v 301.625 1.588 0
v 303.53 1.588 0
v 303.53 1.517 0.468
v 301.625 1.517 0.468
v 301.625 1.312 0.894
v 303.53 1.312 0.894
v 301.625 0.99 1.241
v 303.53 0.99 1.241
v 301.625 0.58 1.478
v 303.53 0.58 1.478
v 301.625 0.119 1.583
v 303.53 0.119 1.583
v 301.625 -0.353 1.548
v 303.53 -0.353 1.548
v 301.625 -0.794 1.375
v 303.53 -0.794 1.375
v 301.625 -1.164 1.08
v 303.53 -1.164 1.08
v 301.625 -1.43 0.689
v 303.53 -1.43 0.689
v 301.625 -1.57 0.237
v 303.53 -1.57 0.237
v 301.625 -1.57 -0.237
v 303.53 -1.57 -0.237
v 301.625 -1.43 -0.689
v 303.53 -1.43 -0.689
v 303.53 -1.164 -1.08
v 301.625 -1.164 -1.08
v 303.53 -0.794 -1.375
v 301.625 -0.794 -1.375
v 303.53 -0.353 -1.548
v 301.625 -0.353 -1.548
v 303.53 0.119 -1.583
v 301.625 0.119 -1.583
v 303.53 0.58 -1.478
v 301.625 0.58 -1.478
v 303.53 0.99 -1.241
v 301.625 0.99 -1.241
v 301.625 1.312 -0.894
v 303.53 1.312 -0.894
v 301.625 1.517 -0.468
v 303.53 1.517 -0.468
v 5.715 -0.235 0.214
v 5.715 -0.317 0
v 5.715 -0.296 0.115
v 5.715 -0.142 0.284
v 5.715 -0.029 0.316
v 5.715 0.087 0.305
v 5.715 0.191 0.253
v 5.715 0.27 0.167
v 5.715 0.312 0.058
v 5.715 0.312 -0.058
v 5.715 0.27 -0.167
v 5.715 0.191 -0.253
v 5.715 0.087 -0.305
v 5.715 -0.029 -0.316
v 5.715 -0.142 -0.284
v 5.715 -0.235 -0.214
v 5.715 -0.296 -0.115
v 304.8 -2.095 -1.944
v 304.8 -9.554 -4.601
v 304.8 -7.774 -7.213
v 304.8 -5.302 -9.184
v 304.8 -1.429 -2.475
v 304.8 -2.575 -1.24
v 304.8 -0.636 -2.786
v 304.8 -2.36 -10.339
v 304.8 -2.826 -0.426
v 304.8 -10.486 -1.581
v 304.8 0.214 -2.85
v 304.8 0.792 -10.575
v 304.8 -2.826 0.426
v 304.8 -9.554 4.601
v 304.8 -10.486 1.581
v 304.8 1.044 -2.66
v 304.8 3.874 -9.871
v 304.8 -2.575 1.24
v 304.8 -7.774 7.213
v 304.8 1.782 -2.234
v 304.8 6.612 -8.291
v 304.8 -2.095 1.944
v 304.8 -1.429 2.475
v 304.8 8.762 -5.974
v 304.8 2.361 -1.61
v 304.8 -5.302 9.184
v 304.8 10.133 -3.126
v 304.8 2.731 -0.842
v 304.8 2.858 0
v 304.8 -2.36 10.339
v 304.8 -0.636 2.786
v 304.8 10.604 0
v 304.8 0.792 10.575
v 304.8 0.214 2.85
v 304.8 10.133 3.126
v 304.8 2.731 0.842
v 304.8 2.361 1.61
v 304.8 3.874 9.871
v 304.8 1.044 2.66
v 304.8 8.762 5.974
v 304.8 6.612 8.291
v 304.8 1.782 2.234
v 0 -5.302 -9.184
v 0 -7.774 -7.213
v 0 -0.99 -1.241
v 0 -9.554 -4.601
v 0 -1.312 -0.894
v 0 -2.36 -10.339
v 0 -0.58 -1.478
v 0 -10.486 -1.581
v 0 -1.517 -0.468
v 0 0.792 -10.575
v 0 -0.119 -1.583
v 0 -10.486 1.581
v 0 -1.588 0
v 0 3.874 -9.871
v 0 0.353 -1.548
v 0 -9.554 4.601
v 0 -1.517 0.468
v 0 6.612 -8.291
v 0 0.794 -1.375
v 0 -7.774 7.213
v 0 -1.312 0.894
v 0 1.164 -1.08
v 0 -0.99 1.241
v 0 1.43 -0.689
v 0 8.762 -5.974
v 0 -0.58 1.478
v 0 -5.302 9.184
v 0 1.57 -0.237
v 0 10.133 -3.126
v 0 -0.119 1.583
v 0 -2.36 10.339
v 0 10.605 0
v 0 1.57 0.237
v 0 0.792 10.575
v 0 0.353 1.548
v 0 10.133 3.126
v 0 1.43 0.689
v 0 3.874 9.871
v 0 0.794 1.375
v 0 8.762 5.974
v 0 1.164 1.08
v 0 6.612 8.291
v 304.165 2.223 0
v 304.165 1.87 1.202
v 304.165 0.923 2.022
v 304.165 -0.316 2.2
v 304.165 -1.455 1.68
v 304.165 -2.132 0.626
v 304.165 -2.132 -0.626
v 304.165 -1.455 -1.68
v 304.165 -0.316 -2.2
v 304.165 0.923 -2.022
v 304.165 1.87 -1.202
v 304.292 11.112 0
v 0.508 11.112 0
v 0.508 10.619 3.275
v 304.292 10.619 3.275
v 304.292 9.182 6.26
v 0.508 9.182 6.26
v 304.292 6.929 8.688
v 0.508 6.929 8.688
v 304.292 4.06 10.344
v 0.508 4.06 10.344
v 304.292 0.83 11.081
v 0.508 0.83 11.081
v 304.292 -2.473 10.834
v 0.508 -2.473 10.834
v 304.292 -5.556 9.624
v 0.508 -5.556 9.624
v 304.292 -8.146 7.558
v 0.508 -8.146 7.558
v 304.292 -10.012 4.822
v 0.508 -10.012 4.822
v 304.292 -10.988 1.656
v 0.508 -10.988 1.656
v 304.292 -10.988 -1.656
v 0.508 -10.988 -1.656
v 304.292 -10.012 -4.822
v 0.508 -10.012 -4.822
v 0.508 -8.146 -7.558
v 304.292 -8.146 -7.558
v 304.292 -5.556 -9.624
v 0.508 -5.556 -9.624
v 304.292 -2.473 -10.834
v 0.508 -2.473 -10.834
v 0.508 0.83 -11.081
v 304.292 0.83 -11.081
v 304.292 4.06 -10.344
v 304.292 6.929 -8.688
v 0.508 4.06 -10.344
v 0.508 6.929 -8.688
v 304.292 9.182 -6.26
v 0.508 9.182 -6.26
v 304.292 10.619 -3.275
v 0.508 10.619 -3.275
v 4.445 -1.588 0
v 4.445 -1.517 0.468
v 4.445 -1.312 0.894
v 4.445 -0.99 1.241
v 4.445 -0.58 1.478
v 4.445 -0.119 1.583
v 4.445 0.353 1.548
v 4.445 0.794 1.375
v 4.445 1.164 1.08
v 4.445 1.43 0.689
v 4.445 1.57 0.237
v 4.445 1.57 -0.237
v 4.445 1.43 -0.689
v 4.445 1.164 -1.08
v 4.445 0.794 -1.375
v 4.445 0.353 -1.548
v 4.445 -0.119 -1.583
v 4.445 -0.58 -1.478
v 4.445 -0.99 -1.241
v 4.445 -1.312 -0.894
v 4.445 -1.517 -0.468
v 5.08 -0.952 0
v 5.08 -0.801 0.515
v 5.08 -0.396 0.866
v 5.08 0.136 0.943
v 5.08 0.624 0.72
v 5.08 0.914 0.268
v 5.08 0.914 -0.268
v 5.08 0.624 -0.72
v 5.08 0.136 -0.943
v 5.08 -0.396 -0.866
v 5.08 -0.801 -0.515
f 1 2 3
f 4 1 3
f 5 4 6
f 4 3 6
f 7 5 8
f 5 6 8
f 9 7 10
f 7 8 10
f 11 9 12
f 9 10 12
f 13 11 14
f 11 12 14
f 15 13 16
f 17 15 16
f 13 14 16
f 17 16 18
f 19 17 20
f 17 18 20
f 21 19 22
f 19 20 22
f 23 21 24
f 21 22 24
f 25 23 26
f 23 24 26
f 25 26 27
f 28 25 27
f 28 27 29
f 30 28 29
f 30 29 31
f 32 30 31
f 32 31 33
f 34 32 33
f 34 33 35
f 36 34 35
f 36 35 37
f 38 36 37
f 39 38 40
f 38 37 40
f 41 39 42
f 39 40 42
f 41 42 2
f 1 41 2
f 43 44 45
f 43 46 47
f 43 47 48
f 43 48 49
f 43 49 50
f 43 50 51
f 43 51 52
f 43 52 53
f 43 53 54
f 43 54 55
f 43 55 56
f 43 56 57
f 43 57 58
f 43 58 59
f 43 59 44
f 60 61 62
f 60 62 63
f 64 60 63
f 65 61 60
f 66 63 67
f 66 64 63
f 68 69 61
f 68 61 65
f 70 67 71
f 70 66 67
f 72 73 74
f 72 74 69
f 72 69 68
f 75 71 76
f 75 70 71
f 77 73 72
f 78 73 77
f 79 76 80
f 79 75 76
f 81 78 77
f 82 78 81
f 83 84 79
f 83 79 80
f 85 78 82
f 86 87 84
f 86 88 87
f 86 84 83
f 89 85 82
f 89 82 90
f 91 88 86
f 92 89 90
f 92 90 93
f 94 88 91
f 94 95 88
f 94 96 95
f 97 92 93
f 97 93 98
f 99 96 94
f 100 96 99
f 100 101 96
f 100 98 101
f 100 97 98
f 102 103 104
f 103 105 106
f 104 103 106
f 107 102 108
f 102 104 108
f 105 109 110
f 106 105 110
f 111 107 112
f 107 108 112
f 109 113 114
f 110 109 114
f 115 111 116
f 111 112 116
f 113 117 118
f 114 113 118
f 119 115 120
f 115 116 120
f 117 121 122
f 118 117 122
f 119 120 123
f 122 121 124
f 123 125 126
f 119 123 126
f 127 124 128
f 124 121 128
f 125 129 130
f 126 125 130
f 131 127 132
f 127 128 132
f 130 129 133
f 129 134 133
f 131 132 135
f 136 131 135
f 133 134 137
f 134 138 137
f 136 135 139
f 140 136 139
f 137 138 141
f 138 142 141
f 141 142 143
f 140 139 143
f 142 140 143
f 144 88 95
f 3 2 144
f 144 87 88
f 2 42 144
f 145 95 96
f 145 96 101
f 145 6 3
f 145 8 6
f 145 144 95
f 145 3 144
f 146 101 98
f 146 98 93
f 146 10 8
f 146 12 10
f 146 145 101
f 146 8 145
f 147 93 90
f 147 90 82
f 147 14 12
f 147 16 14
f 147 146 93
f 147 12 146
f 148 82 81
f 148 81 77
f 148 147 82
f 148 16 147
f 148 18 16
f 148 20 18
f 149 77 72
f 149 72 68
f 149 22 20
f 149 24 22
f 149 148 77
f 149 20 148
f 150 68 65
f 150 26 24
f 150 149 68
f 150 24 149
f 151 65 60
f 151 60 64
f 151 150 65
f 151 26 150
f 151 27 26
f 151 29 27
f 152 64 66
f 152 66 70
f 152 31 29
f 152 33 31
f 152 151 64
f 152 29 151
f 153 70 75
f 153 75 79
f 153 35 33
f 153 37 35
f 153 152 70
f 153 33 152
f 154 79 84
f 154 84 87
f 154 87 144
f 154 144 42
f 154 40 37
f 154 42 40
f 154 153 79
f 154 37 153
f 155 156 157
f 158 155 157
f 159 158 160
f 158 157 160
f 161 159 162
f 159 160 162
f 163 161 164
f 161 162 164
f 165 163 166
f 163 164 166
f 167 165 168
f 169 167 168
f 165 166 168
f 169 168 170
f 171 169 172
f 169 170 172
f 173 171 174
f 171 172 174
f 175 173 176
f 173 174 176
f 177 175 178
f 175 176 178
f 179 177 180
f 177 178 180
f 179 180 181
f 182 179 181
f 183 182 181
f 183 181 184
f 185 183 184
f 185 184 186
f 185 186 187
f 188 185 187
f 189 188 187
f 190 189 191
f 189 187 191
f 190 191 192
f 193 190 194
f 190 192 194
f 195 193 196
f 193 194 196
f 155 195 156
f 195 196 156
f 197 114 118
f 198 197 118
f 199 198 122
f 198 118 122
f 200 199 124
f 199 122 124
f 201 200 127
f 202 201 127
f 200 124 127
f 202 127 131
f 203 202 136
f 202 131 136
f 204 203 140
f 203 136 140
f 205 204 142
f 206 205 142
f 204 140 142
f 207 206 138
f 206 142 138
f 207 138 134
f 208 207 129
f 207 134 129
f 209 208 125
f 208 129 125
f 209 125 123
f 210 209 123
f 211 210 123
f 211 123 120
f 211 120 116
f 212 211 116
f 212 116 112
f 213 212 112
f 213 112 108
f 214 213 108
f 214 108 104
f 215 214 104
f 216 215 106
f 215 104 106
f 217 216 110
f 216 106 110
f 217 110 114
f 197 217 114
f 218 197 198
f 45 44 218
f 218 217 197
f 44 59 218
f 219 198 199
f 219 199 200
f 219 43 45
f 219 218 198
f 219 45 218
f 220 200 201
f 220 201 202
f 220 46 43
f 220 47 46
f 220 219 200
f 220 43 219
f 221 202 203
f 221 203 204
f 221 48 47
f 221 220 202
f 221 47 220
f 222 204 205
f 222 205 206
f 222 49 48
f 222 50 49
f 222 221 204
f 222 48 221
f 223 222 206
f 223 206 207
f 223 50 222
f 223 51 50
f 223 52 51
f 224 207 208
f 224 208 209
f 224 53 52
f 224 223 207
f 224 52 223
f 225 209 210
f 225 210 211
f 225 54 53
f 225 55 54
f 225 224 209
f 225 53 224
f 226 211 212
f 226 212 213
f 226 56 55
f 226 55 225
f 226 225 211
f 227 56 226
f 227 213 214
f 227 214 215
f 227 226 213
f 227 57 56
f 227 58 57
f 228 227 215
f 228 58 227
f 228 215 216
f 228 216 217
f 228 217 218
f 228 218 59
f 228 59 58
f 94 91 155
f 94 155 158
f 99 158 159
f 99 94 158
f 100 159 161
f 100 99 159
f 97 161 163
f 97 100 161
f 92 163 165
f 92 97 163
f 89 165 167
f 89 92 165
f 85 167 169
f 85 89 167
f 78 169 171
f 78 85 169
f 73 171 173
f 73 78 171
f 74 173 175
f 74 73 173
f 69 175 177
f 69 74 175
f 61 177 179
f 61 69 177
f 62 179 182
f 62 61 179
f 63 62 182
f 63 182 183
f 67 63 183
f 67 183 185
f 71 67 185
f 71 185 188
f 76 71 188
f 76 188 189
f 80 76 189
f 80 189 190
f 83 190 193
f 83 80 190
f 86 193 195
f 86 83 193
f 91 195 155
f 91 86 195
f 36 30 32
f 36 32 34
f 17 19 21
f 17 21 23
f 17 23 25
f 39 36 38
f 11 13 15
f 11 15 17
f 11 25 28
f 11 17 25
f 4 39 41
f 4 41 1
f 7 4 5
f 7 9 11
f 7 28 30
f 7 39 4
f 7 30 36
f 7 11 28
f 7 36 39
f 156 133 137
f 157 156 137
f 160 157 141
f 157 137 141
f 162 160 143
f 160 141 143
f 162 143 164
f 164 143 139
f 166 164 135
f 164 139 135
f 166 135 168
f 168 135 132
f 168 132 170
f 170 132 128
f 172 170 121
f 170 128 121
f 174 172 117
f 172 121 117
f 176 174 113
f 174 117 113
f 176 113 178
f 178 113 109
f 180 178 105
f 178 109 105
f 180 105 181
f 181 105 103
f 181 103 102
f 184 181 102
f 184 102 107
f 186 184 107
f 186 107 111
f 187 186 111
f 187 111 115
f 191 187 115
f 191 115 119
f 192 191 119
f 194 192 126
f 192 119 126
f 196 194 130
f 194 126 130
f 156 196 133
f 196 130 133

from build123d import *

# Parameters (mm, degrees)
F0_R     = 11.1125
F1_DEPTH = 304.8
F2_R     = 1.5875
F3_DEPTH = 3.175
F4_R     = 1.5875
F5_DEPTH = 5.715
F6_SIZE  = 0.508
F7_SIZE  = 1.27


with BuildPart() as f1:
    # F0 (on Right) → F1 (new body)
    with BuildSketch(Plane.YZ):
        Circle(F0_R)
    extrude(amount=F1_DEPTH)

    # F2 (on face) → F3 (cut)
    with BuildSketch(Plane.YZ.offset(304.8)):
        Circle(F2_R)
    extrude(amount=-F3_DEPTH, mode=Mode.SUBTRACT)

    # F4 (on face) → F5 (cut)
    with BuildSketch(Plane(origin=(0, 0, 0), x_dir=(0, -1, 0), z_dir=(-1, 0, 0))):
        Circle(F4_R)
    extrude(amount=-F5_DEPTH, mode=Mode.SUBTRACT)

    # F6
    f6_edges = [f1.edges().sort_by_distance(p)[0] for p in [
        (0, -11.1125, 0),
        (304.8, -11.1125, 0),
    ]]
    chamfer(f6_edges, length=F6_SIZE)

    # F7
    f7_edges = [f1.edges().sort_by_distance(p)[0] for p in [
        (304.8, -1.5875, 0),
        (5.715, 1.5875, 0),
    ]]
    chamfer(f7_edges, length=F7_SIZE)


solid = f1.part
